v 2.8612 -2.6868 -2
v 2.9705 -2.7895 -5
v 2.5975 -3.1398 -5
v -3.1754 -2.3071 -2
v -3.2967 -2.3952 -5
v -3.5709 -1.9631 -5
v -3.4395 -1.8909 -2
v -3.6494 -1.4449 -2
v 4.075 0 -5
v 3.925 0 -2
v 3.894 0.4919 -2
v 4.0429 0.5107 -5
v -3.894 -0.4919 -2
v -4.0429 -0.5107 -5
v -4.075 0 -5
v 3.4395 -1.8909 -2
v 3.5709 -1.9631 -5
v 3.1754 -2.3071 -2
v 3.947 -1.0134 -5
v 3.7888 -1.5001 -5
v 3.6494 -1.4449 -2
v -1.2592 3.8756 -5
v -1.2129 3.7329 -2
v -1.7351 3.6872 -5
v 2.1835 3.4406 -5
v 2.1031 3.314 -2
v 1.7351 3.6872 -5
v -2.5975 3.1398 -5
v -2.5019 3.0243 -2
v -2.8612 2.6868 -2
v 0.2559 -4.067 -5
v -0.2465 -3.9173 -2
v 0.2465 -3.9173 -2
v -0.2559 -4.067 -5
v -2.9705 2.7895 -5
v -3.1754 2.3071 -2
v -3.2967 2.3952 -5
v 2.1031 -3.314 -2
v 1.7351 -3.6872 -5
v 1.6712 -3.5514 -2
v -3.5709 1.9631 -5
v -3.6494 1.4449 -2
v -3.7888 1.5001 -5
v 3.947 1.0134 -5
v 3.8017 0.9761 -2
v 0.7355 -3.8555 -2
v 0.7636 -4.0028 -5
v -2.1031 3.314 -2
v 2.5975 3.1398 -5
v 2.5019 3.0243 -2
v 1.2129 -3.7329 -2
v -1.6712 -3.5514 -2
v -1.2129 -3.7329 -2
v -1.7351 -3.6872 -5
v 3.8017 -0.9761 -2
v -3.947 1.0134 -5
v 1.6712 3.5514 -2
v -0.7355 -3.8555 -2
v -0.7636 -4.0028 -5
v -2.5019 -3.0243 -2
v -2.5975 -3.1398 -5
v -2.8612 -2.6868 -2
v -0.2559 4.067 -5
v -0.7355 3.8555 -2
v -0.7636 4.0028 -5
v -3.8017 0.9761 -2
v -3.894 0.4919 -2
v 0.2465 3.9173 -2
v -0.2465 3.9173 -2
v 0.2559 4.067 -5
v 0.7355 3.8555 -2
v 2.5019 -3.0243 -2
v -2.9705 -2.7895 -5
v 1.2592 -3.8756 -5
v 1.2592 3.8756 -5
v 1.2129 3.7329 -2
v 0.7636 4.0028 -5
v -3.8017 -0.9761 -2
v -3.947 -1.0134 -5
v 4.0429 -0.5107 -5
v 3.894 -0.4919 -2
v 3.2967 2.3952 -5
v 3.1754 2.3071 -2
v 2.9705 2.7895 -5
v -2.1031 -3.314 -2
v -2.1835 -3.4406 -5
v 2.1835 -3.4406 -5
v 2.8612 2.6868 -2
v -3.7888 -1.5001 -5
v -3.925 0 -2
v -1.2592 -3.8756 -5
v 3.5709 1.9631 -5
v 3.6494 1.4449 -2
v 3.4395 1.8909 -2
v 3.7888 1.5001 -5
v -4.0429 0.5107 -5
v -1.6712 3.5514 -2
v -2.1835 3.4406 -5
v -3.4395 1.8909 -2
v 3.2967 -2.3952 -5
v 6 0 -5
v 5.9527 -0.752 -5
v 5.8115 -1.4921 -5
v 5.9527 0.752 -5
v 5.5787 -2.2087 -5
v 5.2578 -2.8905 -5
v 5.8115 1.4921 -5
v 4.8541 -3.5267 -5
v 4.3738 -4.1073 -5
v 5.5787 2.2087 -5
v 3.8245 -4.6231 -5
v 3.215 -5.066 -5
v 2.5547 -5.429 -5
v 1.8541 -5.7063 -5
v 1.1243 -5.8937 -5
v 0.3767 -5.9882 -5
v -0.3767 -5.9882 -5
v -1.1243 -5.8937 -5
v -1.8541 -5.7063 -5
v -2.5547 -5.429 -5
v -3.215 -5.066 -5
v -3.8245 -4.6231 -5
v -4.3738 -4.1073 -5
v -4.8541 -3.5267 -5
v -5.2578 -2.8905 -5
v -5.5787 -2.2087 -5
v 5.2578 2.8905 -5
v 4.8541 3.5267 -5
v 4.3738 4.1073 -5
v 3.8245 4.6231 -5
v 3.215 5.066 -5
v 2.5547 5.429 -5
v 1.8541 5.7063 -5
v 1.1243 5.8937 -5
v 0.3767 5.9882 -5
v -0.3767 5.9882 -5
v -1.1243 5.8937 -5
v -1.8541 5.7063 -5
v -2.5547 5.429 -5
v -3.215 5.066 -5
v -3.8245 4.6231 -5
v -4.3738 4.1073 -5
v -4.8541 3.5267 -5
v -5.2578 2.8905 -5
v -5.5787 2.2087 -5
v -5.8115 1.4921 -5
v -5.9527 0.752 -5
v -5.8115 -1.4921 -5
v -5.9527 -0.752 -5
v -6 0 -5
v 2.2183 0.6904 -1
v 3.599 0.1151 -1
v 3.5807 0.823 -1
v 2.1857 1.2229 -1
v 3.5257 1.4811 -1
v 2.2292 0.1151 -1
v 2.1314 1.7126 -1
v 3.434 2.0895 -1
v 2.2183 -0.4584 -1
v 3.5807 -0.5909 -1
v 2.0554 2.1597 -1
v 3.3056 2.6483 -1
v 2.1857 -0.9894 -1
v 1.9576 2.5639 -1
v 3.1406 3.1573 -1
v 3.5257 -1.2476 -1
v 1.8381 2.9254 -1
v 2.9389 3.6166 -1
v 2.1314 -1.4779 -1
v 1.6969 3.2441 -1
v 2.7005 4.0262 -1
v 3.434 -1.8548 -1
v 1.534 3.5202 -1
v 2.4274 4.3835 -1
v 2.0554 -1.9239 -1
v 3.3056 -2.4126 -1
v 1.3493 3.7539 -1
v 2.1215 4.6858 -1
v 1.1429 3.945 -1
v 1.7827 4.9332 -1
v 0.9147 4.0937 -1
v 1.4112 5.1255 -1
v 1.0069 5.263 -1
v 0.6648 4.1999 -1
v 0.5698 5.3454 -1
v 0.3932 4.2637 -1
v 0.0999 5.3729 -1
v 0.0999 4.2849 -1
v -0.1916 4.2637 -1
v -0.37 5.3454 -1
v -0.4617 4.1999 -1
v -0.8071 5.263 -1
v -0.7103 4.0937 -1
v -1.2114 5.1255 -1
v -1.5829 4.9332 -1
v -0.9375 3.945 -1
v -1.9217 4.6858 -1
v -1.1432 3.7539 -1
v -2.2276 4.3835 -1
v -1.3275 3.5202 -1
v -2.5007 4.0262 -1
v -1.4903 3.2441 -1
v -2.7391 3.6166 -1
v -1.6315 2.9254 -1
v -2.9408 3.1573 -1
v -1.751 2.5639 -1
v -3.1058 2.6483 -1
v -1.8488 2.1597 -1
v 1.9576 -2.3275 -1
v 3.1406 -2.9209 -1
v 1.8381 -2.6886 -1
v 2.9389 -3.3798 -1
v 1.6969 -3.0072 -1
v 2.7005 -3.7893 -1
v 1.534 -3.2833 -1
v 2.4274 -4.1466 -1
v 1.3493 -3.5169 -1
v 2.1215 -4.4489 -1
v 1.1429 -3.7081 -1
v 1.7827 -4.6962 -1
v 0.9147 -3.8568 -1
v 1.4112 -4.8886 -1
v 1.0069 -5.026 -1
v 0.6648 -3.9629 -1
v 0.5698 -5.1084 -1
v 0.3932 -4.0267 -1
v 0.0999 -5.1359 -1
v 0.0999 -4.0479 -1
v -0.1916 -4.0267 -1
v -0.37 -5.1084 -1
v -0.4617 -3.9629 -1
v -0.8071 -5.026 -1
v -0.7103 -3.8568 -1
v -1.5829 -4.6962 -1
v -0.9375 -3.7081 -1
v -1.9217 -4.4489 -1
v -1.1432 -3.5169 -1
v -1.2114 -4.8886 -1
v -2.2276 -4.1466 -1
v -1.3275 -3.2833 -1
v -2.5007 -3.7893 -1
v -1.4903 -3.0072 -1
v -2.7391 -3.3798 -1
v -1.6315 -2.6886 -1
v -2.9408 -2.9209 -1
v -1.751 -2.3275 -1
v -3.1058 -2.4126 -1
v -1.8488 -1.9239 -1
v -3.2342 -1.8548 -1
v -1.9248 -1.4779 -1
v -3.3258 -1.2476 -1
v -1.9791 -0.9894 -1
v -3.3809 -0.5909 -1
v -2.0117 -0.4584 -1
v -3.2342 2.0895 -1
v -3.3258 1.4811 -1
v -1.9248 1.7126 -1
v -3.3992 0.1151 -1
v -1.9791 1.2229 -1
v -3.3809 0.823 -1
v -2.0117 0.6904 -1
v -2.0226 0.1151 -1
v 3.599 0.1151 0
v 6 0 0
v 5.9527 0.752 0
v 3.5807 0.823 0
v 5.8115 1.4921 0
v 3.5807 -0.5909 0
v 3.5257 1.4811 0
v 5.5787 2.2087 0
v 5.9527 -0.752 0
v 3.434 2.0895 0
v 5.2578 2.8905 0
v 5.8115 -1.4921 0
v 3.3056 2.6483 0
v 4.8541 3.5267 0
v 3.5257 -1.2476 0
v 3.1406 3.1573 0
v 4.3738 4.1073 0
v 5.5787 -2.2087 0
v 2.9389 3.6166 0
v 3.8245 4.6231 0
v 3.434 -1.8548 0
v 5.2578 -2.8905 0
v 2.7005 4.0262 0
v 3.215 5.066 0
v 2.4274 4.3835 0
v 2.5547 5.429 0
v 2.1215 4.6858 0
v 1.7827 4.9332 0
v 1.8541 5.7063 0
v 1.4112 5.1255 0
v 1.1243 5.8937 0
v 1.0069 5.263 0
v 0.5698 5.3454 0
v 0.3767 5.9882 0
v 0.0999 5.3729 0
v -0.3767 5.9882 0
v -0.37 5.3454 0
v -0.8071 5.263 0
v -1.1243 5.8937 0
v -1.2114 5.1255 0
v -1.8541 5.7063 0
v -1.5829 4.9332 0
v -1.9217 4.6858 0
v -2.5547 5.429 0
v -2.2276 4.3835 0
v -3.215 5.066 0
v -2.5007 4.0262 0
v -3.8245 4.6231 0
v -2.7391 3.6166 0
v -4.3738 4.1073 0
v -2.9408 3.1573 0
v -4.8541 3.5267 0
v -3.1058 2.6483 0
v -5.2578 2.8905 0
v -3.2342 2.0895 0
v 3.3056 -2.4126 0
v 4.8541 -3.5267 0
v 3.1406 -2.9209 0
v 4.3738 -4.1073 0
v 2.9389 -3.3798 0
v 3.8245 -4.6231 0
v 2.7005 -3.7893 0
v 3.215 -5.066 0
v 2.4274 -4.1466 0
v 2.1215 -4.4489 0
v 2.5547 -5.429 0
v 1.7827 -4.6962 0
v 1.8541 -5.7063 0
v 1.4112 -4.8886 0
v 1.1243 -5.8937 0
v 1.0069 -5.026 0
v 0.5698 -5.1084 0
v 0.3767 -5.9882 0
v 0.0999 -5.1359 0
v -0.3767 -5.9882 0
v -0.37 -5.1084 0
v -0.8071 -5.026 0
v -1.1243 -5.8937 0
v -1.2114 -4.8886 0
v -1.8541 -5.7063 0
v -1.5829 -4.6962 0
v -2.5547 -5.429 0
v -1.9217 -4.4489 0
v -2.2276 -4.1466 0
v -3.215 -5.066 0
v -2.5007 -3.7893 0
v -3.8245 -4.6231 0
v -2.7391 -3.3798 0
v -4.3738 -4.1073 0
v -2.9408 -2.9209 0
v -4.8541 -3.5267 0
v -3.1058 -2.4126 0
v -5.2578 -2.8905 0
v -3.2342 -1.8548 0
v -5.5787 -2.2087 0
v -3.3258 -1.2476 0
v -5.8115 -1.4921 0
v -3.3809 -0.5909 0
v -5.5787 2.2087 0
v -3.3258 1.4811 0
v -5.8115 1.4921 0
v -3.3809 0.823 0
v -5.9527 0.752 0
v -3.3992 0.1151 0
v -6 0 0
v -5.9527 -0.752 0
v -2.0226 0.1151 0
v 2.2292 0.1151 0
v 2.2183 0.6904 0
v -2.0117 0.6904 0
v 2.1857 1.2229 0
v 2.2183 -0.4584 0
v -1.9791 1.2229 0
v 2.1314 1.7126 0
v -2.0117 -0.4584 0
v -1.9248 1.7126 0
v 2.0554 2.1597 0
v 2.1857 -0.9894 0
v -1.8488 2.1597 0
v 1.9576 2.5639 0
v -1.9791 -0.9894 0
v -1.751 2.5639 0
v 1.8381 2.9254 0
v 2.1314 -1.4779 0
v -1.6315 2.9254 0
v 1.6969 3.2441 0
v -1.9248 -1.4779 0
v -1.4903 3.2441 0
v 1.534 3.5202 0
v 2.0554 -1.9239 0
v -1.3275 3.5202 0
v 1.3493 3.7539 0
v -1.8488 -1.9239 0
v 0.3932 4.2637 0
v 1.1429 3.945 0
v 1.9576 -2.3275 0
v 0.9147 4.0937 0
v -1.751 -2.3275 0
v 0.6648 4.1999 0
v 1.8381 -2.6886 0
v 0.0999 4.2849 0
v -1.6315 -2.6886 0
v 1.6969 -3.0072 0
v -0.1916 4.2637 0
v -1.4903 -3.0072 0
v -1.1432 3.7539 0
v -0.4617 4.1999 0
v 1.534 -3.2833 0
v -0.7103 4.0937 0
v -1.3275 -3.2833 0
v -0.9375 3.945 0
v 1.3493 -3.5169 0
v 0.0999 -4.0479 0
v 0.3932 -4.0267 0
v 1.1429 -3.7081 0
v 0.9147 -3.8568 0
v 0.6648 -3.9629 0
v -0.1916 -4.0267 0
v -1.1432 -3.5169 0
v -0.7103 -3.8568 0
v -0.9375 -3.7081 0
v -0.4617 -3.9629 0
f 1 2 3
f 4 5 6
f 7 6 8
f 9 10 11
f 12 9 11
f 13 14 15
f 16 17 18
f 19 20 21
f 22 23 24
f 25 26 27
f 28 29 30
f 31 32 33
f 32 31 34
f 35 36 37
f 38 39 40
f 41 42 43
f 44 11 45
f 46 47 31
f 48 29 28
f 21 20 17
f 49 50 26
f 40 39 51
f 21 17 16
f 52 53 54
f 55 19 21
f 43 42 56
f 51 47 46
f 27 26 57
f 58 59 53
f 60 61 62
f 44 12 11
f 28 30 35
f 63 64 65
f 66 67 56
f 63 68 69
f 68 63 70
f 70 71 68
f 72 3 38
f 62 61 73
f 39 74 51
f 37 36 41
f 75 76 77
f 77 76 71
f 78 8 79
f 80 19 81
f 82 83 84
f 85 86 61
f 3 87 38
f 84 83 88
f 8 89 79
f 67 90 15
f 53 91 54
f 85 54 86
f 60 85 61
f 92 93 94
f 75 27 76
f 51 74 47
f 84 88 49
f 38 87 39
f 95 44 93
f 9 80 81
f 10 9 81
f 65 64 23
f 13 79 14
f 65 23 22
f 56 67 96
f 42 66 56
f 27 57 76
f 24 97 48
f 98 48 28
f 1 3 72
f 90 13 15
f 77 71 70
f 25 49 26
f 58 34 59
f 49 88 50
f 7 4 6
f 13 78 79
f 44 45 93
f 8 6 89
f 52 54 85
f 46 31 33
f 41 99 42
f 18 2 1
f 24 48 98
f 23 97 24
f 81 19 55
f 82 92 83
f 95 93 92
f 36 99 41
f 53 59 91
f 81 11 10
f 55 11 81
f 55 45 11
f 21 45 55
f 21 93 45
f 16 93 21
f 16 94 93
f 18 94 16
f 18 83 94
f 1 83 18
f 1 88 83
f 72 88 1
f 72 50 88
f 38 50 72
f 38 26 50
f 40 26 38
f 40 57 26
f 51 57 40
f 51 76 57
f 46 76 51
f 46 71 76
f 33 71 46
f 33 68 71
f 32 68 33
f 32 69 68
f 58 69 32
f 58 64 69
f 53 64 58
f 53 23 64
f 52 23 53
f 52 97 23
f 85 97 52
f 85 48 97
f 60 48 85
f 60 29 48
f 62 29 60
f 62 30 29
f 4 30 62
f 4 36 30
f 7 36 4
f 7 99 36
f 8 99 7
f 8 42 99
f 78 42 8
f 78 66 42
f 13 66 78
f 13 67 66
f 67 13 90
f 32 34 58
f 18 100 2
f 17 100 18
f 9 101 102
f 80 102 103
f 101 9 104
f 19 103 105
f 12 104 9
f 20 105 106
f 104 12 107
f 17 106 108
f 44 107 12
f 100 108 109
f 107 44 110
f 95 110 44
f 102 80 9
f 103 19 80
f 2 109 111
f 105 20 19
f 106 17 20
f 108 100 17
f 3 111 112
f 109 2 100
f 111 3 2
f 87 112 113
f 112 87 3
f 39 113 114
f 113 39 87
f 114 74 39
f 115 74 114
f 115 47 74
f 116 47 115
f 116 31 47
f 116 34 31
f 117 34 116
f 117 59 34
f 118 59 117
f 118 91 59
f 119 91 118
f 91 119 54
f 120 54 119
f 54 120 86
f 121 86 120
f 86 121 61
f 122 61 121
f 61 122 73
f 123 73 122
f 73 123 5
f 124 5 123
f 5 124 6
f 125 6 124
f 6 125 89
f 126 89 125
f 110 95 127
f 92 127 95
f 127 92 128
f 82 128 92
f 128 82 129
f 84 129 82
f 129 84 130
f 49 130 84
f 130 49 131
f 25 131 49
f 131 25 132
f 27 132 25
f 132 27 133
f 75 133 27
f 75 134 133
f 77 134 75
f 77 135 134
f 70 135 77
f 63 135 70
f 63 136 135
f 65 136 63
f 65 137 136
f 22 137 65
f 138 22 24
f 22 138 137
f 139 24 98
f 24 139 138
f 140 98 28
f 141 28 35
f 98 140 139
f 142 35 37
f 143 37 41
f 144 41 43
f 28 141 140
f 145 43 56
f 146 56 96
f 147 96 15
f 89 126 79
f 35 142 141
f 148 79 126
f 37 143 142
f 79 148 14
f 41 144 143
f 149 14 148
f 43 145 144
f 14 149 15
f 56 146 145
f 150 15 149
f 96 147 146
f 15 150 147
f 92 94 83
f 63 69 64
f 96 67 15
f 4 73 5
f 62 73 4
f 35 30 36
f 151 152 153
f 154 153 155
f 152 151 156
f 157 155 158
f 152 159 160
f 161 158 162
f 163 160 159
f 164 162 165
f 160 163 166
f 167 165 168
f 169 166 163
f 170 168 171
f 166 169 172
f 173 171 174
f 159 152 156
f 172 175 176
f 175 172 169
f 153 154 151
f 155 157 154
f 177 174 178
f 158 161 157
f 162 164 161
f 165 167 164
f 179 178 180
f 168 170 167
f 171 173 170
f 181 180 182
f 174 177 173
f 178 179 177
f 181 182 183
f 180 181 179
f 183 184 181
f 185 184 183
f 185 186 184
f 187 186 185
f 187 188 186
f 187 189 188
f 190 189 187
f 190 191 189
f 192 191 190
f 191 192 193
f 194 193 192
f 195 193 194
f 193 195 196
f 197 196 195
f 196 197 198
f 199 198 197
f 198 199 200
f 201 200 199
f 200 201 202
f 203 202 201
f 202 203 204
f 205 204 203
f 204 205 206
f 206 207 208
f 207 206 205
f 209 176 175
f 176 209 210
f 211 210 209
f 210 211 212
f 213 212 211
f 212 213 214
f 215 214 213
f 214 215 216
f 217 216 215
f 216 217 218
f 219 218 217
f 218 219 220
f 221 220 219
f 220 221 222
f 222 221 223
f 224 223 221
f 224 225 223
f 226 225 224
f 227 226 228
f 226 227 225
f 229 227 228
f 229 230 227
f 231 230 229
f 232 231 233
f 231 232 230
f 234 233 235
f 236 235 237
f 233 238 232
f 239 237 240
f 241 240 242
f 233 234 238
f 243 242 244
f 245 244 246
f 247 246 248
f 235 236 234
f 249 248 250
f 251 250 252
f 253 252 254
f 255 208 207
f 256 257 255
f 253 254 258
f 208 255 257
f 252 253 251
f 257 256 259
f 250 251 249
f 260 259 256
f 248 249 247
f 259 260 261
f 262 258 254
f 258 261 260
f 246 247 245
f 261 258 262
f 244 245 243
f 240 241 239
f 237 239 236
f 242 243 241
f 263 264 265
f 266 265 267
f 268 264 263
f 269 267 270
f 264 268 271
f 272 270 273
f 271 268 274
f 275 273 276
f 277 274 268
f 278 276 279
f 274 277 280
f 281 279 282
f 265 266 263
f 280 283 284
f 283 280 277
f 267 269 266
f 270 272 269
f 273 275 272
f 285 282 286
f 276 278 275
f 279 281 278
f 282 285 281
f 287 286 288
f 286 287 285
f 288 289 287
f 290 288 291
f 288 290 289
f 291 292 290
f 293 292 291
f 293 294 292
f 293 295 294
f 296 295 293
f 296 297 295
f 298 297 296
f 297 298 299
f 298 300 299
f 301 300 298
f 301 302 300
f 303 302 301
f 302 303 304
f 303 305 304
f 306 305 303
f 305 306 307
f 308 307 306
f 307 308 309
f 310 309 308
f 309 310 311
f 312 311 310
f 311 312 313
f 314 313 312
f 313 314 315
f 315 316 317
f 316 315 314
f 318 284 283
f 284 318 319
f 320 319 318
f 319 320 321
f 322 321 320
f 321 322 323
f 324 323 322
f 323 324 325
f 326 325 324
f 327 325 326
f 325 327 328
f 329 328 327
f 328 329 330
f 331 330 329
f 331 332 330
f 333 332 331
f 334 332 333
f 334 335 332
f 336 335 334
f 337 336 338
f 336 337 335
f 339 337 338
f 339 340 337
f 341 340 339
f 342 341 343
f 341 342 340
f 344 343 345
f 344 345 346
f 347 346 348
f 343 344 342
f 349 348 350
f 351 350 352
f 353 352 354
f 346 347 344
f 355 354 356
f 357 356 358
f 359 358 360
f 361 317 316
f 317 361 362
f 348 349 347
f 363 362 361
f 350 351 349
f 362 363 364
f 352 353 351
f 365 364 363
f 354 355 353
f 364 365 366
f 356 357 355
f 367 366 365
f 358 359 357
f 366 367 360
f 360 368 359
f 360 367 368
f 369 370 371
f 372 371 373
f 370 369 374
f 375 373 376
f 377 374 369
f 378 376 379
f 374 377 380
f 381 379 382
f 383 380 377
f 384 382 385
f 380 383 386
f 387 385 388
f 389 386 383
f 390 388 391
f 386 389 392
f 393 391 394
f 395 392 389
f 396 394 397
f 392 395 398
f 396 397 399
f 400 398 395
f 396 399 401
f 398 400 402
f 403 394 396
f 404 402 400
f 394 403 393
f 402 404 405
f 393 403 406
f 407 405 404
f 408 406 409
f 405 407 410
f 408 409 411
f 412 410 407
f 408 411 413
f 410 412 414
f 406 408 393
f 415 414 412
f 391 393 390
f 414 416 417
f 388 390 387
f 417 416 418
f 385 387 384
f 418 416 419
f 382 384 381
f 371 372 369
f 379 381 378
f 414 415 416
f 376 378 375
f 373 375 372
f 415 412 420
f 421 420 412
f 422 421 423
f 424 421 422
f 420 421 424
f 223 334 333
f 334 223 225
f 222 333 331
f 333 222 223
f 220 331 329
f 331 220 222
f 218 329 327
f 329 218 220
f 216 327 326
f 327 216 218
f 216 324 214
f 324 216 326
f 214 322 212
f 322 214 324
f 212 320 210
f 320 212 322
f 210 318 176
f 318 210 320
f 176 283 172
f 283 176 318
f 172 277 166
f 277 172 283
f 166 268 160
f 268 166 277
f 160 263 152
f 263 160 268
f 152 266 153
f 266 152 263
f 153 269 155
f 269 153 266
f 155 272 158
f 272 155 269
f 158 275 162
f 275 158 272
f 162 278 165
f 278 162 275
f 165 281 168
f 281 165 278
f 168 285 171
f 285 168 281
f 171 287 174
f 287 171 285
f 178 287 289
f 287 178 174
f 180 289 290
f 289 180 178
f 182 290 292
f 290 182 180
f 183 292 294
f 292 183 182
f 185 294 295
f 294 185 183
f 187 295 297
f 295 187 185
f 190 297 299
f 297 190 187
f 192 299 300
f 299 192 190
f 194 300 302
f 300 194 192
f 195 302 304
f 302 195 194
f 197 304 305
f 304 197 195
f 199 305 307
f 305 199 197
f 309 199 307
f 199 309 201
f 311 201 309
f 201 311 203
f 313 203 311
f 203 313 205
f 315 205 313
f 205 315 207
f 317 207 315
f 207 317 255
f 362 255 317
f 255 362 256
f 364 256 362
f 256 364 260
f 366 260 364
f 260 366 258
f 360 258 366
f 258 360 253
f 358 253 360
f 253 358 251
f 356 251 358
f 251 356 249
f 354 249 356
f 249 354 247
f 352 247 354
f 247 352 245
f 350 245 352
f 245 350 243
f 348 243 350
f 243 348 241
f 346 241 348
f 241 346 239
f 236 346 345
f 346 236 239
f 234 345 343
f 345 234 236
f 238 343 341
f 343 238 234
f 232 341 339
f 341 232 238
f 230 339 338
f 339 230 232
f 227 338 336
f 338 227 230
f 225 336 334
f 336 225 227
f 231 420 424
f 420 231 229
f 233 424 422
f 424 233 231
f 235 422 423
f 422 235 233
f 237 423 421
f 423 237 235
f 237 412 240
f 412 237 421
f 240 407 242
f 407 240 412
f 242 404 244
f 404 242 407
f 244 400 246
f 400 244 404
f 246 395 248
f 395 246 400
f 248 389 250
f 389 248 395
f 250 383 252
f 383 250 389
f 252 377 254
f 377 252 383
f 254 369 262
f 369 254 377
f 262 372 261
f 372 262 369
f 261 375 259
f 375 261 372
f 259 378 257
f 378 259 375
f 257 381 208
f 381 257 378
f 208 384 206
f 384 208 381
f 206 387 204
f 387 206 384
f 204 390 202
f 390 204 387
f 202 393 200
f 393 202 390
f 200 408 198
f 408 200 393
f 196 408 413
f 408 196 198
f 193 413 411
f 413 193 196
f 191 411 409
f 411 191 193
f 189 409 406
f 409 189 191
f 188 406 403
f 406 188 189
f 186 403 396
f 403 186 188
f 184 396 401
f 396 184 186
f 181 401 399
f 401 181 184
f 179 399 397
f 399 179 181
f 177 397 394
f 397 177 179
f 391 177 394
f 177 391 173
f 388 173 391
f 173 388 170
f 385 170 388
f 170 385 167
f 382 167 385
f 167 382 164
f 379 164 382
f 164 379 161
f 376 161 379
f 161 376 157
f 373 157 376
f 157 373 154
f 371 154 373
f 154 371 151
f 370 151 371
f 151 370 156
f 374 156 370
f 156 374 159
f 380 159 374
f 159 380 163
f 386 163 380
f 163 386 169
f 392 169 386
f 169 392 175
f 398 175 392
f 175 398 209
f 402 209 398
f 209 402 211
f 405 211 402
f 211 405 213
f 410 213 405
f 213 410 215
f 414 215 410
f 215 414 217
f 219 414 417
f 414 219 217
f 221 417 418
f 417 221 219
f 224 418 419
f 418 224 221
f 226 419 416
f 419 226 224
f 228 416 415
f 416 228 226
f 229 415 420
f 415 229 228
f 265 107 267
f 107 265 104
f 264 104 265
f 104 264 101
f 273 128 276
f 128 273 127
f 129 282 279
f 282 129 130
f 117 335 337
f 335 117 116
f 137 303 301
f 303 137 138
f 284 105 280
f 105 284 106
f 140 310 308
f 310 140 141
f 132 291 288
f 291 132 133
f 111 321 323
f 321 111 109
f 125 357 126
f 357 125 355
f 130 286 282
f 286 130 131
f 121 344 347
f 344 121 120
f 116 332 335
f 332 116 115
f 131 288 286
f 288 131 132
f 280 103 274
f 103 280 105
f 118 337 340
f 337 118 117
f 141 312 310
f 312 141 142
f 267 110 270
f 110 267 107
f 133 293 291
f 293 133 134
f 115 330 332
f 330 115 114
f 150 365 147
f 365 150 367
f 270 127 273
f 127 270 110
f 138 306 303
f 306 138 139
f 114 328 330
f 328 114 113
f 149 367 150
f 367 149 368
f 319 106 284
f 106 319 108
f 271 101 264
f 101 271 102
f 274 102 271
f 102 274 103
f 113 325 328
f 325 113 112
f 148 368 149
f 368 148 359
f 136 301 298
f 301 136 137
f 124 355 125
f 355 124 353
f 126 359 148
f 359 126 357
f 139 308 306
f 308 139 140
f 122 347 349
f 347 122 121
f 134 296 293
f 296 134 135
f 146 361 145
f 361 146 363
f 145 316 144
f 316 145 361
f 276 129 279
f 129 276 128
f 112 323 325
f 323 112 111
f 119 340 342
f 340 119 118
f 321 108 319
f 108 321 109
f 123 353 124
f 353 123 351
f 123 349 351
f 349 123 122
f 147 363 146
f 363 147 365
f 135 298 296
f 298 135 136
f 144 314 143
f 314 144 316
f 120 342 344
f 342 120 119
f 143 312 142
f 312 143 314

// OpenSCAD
$fn = 50;

difference() {
	union() {
		translate(v = [0, 0, -5.0]) {
			cylinder(h = 5, r = 6.0);
		}
	}
	union() {
		#translate(v = [0, 0, -5.0]) {
			cylinder(h = 3, r1 = 4.075, r2 = 3.925);
		}
		translate(v = [0, 0, -1]) {
			linear_extrude(height = 1) {
				text(font = "Impact", halign = "center", size = 10, text = "0", valign = "center");
			}
		}
	}
}
